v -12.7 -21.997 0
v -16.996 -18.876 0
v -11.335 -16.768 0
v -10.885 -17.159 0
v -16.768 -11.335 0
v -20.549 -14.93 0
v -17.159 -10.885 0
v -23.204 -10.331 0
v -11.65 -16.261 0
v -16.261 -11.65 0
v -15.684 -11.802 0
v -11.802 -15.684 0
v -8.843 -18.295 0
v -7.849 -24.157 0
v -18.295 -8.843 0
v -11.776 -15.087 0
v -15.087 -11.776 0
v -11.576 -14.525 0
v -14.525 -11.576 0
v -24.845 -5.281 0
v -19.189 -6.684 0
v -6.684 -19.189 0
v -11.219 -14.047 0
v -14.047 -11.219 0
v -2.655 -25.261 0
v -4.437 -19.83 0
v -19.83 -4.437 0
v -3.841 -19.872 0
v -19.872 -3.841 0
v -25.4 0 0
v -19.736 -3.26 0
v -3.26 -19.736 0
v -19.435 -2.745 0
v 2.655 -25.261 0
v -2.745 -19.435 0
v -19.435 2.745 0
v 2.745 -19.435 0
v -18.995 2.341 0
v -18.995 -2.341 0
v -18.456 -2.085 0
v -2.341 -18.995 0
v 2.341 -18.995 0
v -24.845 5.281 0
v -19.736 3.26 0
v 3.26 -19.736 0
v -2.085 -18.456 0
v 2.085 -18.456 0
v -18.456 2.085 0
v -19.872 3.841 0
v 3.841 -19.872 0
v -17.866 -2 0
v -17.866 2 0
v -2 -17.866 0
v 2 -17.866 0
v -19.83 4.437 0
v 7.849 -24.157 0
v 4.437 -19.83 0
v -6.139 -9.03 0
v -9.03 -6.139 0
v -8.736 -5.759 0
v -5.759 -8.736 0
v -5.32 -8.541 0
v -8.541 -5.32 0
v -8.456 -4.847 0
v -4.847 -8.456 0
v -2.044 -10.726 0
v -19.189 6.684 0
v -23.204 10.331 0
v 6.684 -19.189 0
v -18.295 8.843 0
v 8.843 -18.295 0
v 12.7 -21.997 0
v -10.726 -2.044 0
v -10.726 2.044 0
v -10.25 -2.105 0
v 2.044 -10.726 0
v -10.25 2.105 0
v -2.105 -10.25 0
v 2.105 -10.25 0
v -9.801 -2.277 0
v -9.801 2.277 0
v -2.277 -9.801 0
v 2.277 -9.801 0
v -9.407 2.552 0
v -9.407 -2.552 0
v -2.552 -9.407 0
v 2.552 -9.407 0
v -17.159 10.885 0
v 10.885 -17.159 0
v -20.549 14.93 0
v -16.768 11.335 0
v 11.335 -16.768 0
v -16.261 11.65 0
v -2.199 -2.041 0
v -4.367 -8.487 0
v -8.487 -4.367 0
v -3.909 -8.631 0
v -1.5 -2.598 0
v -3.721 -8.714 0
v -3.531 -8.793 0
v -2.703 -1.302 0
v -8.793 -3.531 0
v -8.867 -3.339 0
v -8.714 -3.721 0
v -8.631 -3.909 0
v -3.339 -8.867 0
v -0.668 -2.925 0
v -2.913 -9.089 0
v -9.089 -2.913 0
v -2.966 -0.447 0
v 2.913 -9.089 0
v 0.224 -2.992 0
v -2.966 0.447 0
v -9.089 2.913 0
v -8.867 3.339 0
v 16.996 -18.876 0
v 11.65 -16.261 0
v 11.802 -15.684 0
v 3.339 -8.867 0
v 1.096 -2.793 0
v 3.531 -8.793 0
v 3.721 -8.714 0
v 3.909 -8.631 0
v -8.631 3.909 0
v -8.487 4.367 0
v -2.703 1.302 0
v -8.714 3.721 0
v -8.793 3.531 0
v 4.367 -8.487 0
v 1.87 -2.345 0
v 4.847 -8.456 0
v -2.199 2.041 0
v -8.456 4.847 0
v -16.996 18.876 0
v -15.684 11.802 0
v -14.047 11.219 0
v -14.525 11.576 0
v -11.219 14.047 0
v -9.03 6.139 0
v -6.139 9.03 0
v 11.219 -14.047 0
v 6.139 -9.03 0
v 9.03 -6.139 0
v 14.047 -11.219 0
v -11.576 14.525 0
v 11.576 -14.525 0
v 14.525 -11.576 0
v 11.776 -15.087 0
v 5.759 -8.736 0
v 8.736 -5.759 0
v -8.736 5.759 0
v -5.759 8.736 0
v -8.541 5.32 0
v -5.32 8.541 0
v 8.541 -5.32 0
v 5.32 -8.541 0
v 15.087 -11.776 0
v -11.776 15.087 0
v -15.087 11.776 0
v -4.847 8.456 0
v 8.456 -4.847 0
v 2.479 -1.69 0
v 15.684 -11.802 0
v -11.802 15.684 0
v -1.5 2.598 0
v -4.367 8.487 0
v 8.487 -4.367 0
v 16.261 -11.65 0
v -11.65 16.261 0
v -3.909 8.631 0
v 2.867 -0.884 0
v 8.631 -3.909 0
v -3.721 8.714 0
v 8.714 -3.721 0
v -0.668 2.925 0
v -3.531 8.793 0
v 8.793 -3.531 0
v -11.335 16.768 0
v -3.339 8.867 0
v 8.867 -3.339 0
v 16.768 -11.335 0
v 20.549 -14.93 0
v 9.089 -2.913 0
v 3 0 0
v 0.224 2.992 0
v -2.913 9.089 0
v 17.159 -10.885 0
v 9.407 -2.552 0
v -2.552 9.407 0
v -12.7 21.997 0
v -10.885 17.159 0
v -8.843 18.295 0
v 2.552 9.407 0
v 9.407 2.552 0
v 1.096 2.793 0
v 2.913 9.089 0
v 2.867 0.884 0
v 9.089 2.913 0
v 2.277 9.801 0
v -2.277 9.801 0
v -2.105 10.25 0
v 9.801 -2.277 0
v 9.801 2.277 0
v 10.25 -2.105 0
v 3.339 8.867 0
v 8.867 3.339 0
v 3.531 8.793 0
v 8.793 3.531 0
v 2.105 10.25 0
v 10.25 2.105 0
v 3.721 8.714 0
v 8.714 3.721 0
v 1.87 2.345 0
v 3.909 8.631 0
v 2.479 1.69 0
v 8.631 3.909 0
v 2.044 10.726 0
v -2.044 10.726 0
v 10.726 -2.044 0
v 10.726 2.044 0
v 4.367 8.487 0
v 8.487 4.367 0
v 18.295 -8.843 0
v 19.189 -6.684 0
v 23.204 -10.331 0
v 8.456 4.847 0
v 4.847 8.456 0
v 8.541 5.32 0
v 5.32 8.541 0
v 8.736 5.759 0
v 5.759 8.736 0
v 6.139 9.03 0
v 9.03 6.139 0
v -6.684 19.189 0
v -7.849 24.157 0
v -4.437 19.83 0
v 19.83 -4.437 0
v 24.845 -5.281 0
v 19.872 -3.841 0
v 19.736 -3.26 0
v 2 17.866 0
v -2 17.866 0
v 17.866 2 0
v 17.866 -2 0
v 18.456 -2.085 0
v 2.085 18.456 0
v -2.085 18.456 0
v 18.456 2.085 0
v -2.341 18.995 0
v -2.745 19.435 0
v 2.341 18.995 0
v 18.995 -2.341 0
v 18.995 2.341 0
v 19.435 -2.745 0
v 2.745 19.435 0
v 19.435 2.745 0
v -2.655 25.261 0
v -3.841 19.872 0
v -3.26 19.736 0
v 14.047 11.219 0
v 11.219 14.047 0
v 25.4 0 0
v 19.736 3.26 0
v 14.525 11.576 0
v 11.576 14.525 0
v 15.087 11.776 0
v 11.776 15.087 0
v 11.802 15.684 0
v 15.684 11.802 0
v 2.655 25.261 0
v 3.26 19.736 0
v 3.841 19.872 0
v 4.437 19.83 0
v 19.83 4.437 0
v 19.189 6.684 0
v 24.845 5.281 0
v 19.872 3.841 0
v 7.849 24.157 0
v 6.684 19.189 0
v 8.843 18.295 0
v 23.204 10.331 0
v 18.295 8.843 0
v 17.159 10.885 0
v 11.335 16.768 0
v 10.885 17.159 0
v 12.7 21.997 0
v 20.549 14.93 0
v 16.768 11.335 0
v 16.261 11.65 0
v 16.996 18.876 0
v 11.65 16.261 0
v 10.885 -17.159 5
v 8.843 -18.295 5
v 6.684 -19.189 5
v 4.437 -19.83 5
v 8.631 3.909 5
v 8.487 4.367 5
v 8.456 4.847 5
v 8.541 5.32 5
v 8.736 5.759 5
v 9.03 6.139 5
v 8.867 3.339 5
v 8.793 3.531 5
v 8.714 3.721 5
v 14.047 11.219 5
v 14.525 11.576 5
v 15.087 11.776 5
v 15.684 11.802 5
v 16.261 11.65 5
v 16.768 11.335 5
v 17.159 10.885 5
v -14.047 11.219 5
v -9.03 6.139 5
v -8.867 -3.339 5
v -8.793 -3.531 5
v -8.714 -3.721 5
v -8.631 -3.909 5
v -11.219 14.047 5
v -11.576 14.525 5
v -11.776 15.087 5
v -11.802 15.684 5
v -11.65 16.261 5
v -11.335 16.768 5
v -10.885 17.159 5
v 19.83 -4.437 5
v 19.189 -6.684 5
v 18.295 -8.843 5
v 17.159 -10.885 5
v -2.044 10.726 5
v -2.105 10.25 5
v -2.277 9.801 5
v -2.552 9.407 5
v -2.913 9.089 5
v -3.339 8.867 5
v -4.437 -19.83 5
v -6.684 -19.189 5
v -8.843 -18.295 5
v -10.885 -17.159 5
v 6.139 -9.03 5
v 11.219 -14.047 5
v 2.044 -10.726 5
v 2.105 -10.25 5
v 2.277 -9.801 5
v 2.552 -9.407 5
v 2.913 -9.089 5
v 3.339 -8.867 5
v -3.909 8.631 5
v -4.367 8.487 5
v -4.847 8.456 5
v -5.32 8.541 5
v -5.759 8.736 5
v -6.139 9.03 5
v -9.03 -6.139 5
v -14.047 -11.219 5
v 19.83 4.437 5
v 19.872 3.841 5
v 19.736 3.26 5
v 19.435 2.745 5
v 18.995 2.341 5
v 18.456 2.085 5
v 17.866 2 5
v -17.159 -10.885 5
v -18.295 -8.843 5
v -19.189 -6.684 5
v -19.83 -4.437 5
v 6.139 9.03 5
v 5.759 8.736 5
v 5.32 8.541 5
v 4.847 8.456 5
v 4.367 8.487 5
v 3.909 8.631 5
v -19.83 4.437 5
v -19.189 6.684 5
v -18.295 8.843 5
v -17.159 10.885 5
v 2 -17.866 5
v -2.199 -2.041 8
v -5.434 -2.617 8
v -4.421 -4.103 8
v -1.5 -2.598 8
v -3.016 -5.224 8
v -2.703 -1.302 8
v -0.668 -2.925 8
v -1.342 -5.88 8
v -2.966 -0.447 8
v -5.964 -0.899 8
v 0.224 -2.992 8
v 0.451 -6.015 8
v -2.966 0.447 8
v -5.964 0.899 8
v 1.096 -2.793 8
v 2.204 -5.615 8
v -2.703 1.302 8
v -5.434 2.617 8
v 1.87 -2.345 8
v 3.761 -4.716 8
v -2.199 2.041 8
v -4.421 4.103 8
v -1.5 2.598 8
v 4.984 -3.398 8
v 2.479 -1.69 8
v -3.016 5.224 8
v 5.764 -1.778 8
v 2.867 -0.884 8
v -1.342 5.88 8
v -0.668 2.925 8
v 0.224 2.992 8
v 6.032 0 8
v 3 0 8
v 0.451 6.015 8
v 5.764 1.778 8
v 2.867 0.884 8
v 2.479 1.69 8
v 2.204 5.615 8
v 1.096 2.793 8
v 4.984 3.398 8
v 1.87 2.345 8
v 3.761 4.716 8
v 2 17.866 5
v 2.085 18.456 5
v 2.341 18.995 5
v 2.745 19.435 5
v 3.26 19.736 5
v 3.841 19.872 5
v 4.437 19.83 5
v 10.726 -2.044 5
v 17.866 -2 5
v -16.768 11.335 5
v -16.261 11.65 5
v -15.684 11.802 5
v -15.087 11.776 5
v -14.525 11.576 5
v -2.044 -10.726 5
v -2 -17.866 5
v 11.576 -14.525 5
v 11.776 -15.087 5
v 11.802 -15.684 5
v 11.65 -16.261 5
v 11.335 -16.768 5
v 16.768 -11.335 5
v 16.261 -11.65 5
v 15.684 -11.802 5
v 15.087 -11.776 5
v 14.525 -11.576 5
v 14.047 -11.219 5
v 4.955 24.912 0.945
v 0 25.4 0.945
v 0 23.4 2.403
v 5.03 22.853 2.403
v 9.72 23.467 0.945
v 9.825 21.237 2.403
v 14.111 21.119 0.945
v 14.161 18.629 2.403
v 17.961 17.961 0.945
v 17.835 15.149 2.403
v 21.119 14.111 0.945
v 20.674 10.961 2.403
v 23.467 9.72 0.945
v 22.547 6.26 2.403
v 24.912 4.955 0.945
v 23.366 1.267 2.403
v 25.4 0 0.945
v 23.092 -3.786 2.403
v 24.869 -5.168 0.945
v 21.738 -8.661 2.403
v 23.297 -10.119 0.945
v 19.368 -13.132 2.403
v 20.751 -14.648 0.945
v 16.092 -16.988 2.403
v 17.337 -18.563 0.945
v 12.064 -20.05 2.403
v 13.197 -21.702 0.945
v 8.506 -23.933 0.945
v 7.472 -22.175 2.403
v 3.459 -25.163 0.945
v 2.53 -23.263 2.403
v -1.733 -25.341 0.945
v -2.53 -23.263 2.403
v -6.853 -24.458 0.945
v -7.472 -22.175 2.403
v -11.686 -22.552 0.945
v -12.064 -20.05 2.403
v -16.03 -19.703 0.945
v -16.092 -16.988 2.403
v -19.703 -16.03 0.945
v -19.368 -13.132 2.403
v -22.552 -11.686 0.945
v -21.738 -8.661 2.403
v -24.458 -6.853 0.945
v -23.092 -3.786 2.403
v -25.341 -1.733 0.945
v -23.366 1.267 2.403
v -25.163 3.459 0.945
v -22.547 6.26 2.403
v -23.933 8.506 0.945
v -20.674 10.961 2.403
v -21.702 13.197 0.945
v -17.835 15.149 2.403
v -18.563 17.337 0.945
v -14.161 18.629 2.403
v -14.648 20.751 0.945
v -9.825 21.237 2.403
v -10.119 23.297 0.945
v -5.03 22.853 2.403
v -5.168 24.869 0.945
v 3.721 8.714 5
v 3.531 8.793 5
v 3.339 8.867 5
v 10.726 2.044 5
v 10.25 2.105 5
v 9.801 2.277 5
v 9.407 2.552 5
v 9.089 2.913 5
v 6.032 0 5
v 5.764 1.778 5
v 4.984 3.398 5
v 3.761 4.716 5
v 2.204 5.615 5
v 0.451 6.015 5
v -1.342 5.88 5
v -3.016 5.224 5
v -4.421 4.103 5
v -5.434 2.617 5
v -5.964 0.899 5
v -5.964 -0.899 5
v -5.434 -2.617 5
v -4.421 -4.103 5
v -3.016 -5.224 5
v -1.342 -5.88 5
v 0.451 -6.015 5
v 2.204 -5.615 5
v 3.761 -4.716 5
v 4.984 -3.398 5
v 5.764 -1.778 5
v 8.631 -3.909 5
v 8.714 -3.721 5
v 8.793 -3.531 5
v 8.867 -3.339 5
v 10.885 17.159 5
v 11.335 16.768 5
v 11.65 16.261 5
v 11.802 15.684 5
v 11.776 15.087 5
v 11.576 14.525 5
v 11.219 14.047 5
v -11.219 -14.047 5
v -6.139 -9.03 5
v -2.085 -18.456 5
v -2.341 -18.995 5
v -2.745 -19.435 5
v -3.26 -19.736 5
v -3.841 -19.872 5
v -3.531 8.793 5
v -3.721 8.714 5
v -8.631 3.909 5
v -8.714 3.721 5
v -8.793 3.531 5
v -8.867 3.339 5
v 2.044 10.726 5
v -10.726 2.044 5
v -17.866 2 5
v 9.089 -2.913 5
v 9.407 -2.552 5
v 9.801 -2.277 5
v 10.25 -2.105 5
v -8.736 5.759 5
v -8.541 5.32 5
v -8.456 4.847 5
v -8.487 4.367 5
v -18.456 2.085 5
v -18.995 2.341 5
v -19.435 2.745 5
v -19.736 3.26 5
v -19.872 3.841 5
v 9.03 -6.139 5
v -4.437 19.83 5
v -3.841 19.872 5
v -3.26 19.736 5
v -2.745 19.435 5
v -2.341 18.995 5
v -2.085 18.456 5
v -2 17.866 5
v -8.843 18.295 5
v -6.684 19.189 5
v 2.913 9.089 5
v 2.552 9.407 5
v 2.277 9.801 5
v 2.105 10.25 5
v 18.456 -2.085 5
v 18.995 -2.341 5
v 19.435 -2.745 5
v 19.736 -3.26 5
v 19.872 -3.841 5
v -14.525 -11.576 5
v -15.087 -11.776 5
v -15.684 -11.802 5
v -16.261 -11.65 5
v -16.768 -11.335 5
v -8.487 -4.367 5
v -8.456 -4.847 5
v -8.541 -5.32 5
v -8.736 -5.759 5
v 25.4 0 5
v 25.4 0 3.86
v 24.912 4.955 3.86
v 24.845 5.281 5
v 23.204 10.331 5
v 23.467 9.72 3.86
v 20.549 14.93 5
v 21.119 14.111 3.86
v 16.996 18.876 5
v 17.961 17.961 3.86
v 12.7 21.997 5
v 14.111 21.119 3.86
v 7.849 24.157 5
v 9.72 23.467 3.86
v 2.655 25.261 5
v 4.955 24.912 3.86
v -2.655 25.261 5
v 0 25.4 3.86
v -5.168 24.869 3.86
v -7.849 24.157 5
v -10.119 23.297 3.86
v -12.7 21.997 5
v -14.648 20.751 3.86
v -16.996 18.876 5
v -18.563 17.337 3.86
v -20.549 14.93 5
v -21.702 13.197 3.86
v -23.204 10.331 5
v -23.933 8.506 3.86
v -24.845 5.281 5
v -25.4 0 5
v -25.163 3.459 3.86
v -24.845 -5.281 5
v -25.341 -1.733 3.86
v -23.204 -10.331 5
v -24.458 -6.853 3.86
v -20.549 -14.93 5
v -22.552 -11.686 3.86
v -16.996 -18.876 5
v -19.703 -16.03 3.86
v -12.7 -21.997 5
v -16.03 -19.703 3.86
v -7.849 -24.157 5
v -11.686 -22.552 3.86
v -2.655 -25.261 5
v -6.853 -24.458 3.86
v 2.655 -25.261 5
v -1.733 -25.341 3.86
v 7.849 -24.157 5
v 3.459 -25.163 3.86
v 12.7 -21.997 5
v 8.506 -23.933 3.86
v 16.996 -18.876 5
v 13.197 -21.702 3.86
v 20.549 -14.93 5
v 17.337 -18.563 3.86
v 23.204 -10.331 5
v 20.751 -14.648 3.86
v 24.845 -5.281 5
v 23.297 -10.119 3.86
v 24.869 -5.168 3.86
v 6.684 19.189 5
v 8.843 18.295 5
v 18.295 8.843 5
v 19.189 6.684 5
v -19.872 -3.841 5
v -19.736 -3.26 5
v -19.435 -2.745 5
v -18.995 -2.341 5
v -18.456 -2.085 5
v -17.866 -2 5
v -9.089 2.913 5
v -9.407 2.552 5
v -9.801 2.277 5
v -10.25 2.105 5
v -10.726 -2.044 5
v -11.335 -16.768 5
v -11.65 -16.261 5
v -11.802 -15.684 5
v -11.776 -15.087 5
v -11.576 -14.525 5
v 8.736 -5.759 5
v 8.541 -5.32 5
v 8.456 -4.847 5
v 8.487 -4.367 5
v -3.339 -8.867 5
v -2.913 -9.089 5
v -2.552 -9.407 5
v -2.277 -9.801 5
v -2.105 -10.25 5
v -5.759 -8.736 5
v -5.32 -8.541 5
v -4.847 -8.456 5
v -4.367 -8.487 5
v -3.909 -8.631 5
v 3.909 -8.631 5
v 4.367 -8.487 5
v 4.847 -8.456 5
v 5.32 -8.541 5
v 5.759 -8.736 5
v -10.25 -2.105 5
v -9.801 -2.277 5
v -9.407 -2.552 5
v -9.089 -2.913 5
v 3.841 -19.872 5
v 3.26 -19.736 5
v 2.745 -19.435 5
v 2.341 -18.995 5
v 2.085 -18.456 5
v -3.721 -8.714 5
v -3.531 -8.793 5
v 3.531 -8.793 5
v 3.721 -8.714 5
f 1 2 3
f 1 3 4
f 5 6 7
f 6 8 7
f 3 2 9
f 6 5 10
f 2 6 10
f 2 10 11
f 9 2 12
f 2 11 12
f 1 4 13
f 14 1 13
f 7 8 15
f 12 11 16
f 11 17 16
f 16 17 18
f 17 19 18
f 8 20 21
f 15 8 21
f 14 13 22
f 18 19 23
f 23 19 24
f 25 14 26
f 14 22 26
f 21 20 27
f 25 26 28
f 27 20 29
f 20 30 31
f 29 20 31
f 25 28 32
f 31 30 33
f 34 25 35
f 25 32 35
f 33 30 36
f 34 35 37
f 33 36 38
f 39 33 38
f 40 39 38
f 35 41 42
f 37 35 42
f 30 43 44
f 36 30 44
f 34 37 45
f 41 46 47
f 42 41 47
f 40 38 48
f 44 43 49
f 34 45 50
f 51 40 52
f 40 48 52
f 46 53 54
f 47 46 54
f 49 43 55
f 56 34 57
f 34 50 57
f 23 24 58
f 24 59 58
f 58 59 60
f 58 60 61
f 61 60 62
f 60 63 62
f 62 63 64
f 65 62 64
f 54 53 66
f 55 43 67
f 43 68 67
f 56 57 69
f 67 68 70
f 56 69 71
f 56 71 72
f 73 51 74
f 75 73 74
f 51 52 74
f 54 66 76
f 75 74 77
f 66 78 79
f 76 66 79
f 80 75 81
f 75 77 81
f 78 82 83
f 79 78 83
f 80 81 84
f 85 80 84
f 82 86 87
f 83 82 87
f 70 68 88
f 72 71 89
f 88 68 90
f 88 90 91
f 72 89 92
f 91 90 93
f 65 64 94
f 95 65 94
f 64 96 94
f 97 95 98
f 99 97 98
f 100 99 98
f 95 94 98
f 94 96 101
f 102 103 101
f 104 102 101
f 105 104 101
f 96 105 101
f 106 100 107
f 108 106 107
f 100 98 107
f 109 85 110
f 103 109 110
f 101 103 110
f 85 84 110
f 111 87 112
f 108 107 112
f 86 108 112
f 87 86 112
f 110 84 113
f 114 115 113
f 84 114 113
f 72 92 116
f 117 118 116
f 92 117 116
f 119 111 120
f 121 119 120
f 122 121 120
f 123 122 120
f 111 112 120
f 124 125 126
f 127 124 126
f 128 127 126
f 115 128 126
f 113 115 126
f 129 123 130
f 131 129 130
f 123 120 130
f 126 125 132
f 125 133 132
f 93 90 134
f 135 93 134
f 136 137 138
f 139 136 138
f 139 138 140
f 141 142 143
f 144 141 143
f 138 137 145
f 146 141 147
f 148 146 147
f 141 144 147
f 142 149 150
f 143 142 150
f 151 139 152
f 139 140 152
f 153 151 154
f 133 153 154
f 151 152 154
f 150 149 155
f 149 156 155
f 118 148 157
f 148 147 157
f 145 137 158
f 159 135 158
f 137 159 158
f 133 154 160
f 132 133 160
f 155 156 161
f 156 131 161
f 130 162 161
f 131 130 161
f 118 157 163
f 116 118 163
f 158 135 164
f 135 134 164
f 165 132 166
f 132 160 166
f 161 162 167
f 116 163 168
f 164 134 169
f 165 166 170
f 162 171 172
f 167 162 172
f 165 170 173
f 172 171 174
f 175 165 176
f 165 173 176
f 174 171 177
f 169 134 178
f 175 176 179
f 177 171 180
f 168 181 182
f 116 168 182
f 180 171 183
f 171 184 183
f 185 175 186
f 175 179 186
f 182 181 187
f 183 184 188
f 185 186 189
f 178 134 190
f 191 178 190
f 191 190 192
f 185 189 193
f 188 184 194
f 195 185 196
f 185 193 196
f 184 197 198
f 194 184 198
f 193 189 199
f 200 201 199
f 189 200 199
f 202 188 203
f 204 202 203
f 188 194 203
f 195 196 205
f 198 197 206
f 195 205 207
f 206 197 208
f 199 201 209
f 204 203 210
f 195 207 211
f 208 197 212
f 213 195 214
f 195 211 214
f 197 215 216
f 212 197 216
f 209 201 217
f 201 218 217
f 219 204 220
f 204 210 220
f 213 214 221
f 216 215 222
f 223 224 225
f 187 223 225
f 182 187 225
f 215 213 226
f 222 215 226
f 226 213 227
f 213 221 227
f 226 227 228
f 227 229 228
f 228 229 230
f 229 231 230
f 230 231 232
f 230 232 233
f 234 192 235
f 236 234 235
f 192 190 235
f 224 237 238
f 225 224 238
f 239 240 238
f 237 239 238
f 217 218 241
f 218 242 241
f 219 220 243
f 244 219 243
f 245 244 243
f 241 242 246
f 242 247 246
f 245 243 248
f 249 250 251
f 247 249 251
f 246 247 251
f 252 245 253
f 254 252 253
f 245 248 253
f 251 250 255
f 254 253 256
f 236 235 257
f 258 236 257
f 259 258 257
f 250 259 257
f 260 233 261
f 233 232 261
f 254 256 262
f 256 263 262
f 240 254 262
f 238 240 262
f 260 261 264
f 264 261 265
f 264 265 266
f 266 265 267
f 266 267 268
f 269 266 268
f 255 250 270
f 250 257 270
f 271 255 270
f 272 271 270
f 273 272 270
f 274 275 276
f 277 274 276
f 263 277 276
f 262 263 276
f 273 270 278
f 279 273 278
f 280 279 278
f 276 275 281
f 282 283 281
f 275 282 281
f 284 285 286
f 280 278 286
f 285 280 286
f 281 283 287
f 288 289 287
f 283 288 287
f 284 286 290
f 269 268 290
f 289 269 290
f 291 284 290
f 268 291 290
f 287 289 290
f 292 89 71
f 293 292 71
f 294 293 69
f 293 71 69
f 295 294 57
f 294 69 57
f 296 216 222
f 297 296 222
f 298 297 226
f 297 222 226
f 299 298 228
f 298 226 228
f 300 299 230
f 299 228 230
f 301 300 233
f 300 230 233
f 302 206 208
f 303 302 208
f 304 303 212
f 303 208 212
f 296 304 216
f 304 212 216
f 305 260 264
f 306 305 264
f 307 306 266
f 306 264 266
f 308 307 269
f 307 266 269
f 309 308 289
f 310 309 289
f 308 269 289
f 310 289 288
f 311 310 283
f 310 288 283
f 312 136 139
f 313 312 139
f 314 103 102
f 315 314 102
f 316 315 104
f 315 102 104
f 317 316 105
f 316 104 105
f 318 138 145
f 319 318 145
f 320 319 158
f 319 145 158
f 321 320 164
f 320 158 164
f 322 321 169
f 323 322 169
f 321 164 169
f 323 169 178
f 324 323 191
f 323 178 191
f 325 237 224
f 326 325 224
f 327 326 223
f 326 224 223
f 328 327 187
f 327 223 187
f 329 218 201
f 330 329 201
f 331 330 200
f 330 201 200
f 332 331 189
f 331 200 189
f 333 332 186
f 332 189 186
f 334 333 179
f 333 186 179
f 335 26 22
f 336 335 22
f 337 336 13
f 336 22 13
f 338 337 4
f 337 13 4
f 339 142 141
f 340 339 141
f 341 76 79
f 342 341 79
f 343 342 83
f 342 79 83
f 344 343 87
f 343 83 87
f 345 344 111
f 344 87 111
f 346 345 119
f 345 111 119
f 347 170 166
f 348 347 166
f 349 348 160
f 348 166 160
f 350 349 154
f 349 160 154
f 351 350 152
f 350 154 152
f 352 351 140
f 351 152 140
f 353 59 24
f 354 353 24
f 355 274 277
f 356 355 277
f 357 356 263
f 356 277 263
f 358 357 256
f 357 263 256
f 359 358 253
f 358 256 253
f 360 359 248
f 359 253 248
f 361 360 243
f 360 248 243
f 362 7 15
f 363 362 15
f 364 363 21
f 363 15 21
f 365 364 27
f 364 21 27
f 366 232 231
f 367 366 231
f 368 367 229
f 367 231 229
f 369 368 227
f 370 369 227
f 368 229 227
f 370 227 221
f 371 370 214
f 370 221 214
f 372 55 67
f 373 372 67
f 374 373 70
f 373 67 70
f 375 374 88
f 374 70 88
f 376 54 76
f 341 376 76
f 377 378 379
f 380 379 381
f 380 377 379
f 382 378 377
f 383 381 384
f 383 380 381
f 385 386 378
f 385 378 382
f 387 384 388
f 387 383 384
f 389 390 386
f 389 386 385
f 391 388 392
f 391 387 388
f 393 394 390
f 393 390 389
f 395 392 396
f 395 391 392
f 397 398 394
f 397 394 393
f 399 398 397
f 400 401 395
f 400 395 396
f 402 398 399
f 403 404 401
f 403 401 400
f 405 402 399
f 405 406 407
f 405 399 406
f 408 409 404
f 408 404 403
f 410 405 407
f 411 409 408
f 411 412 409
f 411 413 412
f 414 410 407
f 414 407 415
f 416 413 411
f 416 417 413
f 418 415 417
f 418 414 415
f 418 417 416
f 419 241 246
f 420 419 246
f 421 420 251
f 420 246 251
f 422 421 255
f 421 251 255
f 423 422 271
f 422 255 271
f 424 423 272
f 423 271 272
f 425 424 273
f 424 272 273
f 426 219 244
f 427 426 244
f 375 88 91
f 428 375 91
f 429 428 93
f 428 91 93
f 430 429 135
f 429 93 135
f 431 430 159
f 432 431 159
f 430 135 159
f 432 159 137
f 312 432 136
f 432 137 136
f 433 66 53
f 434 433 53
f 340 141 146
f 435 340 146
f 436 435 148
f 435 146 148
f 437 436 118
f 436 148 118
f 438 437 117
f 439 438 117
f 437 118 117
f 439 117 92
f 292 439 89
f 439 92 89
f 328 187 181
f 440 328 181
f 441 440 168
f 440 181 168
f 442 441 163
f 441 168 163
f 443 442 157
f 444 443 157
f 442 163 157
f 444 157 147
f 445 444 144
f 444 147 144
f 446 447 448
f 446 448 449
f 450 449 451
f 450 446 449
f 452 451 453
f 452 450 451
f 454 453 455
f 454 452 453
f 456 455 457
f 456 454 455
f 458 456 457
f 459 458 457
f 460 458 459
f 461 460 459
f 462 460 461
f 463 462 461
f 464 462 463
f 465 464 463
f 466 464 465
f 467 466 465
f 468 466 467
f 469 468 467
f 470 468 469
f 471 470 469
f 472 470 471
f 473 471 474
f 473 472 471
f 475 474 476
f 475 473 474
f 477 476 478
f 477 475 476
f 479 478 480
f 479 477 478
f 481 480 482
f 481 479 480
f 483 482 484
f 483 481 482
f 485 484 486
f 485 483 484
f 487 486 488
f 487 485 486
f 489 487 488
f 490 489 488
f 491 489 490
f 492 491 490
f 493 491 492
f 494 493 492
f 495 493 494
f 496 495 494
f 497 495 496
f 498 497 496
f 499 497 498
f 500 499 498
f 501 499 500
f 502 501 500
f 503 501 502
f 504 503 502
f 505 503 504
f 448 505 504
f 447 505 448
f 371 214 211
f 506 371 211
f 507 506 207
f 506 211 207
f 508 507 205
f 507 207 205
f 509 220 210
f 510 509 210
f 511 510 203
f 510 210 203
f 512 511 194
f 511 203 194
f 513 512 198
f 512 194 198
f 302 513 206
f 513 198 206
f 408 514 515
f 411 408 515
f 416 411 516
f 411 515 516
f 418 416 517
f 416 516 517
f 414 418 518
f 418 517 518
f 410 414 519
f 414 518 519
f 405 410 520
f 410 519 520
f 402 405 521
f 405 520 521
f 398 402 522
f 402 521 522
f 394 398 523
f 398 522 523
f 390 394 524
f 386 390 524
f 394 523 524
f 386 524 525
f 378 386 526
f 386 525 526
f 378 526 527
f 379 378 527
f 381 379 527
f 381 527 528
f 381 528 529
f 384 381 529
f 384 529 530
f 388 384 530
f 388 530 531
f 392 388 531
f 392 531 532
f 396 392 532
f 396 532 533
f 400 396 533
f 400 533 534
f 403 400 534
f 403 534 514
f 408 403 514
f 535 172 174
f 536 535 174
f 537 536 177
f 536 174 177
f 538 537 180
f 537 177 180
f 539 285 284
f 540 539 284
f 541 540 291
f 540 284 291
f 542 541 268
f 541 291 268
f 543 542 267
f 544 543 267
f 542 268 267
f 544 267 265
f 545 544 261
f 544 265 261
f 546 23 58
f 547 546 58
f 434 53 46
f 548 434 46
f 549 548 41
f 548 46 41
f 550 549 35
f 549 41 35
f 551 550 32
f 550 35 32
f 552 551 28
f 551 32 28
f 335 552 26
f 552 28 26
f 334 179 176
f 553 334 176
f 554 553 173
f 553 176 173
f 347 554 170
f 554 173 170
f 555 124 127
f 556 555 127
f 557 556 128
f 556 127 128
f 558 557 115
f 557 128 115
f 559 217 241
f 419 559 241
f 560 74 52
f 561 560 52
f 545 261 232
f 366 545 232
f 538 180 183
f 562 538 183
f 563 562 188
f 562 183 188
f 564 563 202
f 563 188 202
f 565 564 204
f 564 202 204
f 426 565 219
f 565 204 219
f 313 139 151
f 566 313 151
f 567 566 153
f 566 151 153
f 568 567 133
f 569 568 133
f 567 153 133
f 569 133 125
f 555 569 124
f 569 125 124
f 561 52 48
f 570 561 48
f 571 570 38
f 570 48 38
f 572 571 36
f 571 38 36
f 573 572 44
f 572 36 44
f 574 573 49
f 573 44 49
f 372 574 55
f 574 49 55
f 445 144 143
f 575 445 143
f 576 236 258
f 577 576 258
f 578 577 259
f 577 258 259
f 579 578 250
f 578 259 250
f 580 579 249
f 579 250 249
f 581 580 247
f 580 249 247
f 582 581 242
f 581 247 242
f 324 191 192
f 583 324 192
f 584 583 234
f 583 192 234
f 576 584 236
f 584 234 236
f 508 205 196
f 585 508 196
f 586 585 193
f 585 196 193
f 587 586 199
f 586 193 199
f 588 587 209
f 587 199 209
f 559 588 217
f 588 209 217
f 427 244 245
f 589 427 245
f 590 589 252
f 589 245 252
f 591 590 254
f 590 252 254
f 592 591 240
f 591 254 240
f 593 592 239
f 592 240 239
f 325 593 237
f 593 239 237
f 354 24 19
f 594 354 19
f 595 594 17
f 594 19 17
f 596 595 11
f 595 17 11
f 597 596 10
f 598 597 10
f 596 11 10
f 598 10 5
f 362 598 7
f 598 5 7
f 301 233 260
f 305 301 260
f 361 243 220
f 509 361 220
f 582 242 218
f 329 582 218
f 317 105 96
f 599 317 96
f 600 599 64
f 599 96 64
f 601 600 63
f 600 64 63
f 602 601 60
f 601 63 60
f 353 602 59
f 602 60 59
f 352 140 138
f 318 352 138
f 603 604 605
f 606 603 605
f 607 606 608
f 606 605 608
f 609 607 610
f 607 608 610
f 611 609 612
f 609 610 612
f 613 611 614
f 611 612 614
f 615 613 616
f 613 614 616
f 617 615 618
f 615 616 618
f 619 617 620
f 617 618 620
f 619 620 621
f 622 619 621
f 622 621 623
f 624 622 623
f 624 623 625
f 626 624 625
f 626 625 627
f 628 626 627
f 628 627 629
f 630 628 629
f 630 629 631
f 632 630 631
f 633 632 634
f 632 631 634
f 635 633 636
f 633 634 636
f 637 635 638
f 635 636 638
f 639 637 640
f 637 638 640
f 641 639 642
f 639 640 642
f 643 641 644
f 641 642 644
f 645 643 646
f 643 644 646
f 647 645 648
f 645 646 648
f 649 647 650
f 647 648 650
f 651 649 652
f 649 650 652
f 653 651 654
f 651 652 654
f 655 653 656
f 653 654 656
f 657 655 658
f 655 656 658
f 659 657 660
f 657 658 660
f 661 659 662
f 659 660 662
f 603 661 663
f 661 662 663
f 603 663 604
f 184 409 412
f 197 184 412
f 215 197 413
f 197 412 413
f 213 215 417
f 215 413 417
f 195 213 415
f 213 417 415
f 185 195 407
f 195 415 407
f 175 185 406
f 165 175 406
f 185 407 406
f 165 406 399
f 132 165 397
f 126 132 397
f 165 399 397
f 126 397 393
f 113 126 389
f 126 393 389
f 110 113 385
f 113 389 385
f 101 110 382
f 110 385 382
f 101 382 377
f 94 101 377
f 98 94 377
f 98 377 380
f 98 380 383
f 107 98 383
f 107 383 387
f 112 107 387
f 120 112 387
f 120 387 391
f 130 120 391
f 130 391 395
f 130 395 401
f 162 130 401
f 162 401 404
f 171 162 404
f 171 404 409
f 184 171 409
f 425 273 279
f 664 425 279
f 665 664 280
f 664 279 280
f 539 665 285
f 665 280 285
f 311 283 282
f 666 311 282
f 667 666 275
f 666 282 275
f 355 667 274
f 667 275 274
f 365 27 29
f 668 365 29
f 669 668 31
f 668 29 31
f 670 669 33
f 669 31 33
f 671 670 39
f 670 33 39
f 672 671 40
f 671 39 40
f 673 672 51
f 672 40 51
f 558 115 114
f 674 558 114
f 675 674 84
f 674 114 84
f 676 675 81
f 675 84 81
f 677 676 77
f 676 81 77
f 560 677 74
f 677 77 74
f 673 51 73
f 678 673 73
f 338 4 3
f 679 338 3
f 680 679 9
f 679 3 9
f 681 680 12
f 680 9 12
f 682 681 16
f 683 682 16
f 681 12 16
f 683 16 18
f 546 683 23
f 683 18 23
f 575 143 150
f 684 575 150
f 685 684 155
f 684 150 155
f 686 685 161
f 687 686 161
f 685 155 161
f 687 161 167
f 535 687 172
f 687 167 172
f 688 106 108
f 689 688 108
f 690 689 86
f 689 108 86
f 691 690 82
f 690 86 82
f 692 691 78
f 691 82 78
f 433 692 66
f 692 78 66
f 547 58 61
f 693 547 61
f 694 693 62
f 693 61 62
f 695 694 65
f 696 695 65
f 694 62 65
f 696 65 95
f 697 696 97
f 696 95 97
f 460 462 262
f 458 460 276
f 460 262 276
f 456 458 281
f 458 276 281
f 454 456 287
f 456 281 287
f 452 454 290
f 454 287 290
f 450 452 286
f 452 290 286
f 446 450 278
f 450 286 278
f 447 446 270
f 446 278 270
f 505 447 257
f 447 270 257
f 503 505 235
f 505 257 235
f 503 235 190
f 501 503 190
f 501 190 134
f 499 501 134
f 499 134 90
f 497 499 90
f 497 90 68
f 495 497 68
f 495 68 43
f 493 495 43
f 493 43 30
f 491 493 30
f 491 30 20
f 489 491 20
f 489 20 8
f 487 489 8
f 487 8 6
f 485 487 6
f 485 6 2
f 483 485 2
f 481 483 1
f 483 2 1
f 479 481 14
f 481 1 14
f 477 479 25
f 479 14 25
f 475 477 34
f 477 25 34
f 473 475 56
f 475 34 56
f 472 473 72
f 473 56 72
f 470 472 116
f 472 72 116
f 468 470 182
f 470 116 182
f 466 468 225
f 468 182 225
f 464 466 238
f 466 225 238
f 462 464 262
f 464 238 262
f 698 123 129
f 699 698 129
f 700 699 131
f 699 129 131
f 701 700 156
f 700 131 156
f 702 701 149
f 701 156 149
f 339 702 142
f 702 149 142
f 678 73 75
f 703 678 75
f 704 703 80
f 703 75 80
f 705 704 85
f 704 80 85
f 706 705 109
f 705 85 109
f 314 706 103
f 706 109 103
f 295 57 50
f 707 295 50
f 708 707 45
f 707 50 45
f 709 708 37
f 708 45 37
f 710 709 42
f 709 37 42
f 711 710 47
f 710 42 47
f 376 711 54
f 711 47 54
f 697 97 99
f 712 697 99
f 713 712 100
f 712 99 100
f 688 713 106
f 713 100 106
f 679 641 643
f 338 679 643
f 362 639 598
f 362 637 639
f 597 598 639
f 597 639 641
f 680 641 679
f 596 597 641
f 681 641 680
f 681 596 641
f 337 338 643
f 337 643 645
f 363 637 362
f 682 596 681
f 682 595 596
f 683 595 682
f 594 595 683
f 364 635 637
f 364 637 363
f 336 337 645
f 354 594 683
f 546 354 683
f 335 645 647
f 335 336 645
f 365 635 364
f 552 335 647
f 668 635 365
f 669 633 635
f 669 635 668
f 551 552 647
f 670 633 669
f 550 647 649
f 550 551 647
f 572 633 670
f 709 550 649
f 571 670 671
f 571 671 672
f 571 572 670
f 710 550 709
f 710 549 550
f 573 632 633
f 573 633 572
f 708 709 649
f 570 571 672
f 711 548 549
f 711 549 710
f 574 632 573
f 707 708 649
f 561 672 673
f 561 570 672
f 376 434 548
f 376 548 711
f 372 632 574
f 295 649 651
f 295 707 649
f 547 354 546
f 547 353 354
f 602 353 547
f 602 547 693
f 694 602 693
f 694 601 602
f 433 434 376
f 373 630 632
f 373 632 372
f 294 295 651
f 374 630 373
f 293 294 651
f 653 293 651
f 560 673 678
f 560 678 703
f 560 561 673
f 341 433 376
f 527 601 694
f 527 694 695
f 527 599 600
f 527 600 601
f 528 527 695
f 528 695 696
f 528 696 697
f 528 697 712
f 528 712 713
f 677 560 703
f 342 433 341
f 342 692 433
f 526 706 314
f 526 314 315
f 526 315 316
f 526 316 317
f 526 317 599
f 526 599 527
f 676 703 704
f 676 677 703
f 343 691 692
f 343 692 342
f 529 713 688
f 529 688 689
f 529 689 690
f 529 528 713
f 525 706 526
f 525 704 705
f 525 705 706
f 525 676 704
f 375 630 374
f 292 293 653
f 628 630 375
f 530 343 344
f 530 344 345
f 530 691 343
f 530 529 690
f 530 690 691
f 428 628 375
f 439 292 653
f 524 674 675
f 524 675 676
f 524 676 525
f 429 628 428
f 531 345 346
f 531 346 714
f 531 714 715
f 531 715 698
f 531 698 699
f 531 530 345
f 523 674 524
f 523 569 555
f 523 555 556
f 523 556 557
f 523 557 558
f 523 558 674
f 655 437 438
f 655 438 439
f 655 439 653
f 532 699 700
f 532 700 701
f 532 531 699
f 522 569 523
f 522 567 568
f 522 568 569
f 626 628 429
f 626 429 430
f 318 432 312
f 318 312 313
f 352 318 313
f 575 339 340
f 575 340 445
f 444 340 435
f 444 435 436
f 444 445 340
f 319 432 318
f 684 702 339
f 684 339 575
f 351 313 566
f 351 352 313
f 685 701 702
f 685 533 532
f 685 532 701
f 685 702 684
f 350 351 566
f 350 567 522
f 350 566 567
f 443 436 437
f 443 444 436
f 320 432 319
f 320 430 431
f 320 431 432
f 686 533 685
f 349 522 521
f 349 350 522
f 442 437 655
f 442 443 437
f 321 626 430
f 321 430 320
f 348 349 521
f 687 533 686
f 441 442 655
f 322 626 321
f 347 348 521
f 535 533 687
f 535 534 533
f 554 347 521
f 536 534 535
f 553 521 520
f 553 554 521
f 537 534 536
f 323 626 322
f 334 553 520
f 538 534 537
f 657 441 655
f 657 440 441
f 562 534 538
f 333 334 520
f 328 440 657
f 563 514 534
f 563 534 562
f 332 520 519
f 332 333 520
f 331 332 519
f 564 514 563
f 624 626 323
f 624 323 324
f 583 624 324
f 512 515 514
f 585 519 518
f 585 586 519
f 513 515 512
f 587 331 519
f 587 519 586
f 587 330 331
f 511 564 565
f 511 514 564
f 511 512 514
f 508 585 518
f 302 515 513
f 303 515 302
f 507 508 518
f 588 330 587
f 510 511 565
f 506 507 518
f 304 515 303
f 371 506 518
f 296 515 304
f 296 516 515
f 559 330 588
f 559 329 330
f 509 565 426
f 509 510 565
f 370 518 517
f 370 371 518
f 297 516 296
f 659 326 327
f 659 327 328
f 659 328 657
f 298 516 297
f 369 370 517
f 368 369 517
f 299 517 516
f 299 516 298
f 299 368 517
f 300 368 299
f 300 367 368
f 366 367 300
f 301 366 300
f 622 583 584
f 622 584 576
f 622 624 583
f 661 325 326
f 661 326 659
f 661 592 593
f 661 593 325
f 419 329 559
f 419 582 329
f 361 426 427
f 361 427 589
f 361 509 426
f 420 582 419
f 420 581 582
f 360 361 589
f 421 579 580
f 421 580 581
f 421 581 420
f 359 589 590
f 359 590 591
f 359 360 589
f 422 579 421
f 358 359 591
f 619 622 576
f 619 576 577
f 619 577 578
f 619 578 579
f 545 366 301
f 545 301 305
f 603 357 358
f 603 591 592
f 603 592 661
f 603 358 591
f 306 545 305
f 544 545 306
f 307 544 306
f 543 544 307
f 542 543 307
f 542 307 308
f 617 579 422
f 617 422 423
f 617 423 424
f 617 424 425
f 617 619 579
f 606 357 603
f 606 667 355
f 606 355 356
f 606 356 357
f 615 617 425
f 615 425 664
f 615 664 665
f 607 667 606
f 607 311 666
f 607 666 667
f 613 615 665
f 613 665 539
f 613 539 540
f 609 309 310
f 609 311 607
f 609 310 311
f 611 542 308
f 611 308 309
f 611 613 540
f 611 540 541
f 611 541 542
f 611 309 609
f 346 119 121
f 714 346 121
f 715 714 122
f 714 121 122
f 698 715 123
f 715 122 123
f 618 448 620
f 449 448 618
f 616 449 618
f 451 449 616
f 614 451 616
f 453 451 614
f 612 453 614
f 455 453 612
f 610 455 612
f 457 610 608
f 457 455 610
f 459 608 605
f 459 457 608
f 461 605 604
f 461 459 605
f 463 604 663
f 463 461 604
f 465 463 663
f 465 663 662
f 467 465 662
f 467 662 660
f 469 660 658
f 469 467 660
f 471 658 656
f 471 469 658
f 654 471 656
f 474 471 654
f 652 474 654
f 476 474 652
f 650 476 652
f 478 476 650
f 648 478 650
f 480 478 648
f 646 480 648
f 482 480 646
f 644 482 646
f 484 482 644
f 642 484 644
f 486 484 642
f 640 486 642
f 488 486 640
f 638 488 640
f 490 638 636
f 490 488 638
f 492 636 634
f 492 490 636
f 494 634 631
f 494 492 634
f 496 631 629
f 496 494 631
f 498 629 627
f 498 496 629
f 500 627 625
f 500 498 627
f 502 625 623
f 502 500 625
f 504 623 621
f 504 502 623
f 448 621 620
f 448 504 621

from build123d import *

# Parameters (mm, degrees)
F0_R     = 25.4
F0_R_2   = 3.125
F1_DEPTH = 5
F2_R     = 6.031593
F3_DEPTH = 8
F4_R     = 3
F5_DEPTH = 8.001


with BuildPart() as f1:
    # F0 (on Top) → F1 (new body)
    with BuildSketch(Plane.XY):
        Circle(F0_R)
        with BuildLine():
            ThreePointArc((-10.88453, -17.158945), (-11.801786, -15.683608), (-11.218679, -14.04716))
            Line((-11.218679, -14.04716), (-6.139343, -9.030124))
            ThreePointArc((-6.139343, -9.030124), (-5.086026, -8.484282), (-3.908805, -8.631157))
            ThreePointArc((-3.908805, -8.631157), (-3.625926, -8.753759), (-3.339207, -8.867092))
            ThreePointArc((-3.339207, -8.867092), (-2.40293, -9.595657), (-2.044091, -10.726433))
            Line((-2.044091, -10.726433), (-2.000038, -17.865646))
            ThreePointArc((-2.000038, -17.865646), (-2.744862, -19.435109), (-4.436681, -19.829732))
            ThreePointArc((-4.436681, -19.829732), (-7.776127, -18.773232), (-10.88453, -17.158945))
        make_face(mode=Mode.SUBTRACT)
        with BuildLine():
            ThreePointArc((-19.829732, -4.436681), (-19.435109, -2.744862), (-17.865646, -2.000038))
            Line((-17.865646, -2.000038), (-10.726433, -2.044091))
            ThreePointArc((-10.726433, -2.044091), (-9.595657, -2.40293), (-8.867092, -3.339207))
            ThreePointArc((-8.867092, -3.339207), (-8.753759, -3.625926), (-8.631157, -3.908805))
            ThreePointArc((-8.631157, -3.908805), (-8.484282, -5.086026), (-9.030124, -6.139343))
            Line((-9.030124, -6.139343), (-14.04716, -11.218679))
            ThreePointArc((-14.04716, -11.218679), (-15.683608, -11.801786), (-17.158945, -10.88453))
            ThreePointArc((-17.158945, -10.88453), (-18.773232, -7.776127), (-19.829732, -4.436681))
        make_face(mode=Mode.SUBTRACT)
        Circle(F0_R_2, mode=Mode.SUBTRACT)
        with BuildLine():
            ThreePointArc((4.436681, -19.829732), (2.744862, -19.435109), (2.000038, -17.865646))
            Line((2.000038, -17.865646), (2.044091, -10.726433))
            ThreePointArc((2.044091, -10.726433), (2.40293, -9.595657), (3.339207, -8.867092))
            ThreePointArc((3.339207, -8.867092), (3.625926, -8.753759), (3.908805, -8.631157))
            ThreePointArc((3.908805, -8.631157), (5.086026, -8.484282), (6.139343, -9.030124))
            Line((6.139343, -9.030124), (11.218679, -14.04716))
            ThreePointArc((11.218679, -14.04716), (11.801786, -15.683608), (10.88453, -17.158945))
            ThreePointArc((10.88453, -17.158945), (7.776127, -18.773232), (4.436681, -19.829732))
        make_face(mode=Mode.SUBTRACT)
        with BuildLine():
            ThreePointArc((17.158945, -10.88453), (15.683608, -11.801786), (14.04716, -11.218679))
            Line((14.04716, -11.218679), (9.030124, -6.139343))
            ThreePointArc((9.030124, -6.139343), (8.484282, -5.086026), (8.631157, -3.908805))
            ThreePointArc((8.631157, -3.908805), (8.753759, -3.625926), (8.867092, -3.339207))
            ThreePointArc((8.867092, -3.339207), (9.595657, -2.40293), (10.726433, -2.044091))
            Line((10.726433, -2.044091), (17.865646, -2.000038))
            ThreePointArc((17.865646, -2.000038), (19.435109, -2.744862), (19.829732, -4.436681))
            ThreePointArc((19.829732, -4.436681), (18.773232, -7.776127), (17.158945, -10.88453))
        make_face(mode=Mode.SUBTRACT)
        with BuildLine():
            ThreePointArc((-17.158945, 10.88453), (-15.683608, 11.801786), (-14.04716, 11.218679))
            Line((-14.04716, 11.218679), (-9.030124, 6.139343))
            ThreePointArc((-9.030124, 6.139343), (-8.484282, 5.086026), (-8.631157, 3.908805))
            ThreePointArc((-8.631157, 3.908805), (-8.753759, 3.625926), (-8.867092, 3.339207))
            ThreePointArc((-8.867092, 3.339207), (-9.595657, 2.40293), (-10.726433, 2.044091))
            Line((-10.726433, 2.044091), (-17.865646, 2.000038))
            ThreePointArc((-17.865646, 2.000038), (-19.435109, 2.744862), (-19.829732, 4.436681))
            ThreePointArc((-19.829732, 4.436681), (-18.773232, 7.776127), (-17.158945, 10.88453))
        make_face(mode=Mode.SUBTRACT)
        with BuildLine():
            ThreePointArc((-10.88453, 17.158945), (-7.776127, 18.773232), (-4.436681, 19.829732))
            ThreePointArc((-4.436681, 19.829732), (-2.744862, 19.435109), (-2.000038, 17.865646))
            Line((-2.000038, 17.865646), (-2.044091, 10.726433))
            ThreePointArc((-2.044091, 10.726433), (-2.40293, 9.595657), (-3.339207, 8.867092))
            ThreePointArc((-3.339207, 8.867092), (-3.625926, 8.753759), (-3.908805, 8.631157))
            ThreePointArc((-3.908805, 8.631157), (-5.086026, 8.484282), (-6.139343, 9.030124))
            Line((-6.139343, 9.030124), (-11.218679, 14.04716))
            ThreePointArc((-11.218679, 14.04716), (-11.801786, 15.683608), (-10.88453, 17.158945))
        make_face(mode=Mode.SUBTRACT)
        with BuildLine():
            ThreePointArc((19.829732, 4.436681), (19.435109, 2.744862), (17.865646, 2.000038))
            Line((17.865646, 2.000038), (10.726433, 2.044091))
            ThreePointArc((10.726433, 2.044091), (9.595657, 2.40293), (8.867092, 3.339207))
            ThreePointArc((8.867092, 3.339207), (8.753759, 3.625926), (8.631157, 3.908805))
            ThreePointArc((8.631157, 3.908805), (8.484282, 5.086026), (9.030124, 6.139343))
            Line((9.030124, 6.139343), (14.04716, 11.218679))
            ThreePointArc((14.04716, 11.218679), (15.683608, 11.801786), (17.158945, 10.88453))
            ThreePointArc((17.158945, 10.88453), (18.773232, 7.776127), (19.829732, 4.436681))
        make_face(mode=Mode.SUBTRACT)
        with BuildLine():
            Line((2.044091, 10.726433), (2.000038, 17.865646))
            ThreePointArc((2.000038, 17.865646), (2.744862, 19.435109), (4.436681, 19.829732))
            ThreePointArc((4.436681, 19.829732), (7.776127, 18.773232), (10.88453, 17.158945))
            ThreePointArc((10.88453, 17.158945), (11.801786, 15.683608), (11.218679, 14.04716))
            Line((11.218679, 14.04716), (6.139343, 9.030124))
            ThreePointArc((6.139343, 9.030124), (5.086026, 8.484282), (3.908805, 8.631157))
            ThreePointArc((3.908805, 8.631157), (3.625926, 8.753759), (3.339207, 8.867092))
            ThreePointArc((3.339207, 8.867092), (2.40293, 9.595657), (2.044091, 10.726433))
        make_face(mode=Mode.SUBTRACT)
    extrude(amount=F1_DEPTH)

    # F2 (on Top) → F3 (join)
    with BuildSketch(Plane.XY):
        Circle(F2_R)
    extrude(amount=F3_DEPTH)

    # F4 (on face) → F5 (cut, through all)
    with BuildSketch(Plane.XY.offset(8)):
        Circle(F4_R)
    extrude(amount=-F5_DEPTH, mode=Mode.SUBTRACT)

    # F6 (on Right) → F7 (revolve, cut)
    with BuildSketch(Plane.YZ):
        Polygon((25.457971, 0.902619), (25.4, 2.402619), (23.4, 2.402619), align=None)
        Polygon((23.4, 2.402619), (25.4, 2.402619), (25.457971, 3.902619), align=None)
    revolve(axis=Axis((0, 0, 8.098846), (0, 0, -1)), mode=Mode.SUBTRACT)


solid = f1.part
